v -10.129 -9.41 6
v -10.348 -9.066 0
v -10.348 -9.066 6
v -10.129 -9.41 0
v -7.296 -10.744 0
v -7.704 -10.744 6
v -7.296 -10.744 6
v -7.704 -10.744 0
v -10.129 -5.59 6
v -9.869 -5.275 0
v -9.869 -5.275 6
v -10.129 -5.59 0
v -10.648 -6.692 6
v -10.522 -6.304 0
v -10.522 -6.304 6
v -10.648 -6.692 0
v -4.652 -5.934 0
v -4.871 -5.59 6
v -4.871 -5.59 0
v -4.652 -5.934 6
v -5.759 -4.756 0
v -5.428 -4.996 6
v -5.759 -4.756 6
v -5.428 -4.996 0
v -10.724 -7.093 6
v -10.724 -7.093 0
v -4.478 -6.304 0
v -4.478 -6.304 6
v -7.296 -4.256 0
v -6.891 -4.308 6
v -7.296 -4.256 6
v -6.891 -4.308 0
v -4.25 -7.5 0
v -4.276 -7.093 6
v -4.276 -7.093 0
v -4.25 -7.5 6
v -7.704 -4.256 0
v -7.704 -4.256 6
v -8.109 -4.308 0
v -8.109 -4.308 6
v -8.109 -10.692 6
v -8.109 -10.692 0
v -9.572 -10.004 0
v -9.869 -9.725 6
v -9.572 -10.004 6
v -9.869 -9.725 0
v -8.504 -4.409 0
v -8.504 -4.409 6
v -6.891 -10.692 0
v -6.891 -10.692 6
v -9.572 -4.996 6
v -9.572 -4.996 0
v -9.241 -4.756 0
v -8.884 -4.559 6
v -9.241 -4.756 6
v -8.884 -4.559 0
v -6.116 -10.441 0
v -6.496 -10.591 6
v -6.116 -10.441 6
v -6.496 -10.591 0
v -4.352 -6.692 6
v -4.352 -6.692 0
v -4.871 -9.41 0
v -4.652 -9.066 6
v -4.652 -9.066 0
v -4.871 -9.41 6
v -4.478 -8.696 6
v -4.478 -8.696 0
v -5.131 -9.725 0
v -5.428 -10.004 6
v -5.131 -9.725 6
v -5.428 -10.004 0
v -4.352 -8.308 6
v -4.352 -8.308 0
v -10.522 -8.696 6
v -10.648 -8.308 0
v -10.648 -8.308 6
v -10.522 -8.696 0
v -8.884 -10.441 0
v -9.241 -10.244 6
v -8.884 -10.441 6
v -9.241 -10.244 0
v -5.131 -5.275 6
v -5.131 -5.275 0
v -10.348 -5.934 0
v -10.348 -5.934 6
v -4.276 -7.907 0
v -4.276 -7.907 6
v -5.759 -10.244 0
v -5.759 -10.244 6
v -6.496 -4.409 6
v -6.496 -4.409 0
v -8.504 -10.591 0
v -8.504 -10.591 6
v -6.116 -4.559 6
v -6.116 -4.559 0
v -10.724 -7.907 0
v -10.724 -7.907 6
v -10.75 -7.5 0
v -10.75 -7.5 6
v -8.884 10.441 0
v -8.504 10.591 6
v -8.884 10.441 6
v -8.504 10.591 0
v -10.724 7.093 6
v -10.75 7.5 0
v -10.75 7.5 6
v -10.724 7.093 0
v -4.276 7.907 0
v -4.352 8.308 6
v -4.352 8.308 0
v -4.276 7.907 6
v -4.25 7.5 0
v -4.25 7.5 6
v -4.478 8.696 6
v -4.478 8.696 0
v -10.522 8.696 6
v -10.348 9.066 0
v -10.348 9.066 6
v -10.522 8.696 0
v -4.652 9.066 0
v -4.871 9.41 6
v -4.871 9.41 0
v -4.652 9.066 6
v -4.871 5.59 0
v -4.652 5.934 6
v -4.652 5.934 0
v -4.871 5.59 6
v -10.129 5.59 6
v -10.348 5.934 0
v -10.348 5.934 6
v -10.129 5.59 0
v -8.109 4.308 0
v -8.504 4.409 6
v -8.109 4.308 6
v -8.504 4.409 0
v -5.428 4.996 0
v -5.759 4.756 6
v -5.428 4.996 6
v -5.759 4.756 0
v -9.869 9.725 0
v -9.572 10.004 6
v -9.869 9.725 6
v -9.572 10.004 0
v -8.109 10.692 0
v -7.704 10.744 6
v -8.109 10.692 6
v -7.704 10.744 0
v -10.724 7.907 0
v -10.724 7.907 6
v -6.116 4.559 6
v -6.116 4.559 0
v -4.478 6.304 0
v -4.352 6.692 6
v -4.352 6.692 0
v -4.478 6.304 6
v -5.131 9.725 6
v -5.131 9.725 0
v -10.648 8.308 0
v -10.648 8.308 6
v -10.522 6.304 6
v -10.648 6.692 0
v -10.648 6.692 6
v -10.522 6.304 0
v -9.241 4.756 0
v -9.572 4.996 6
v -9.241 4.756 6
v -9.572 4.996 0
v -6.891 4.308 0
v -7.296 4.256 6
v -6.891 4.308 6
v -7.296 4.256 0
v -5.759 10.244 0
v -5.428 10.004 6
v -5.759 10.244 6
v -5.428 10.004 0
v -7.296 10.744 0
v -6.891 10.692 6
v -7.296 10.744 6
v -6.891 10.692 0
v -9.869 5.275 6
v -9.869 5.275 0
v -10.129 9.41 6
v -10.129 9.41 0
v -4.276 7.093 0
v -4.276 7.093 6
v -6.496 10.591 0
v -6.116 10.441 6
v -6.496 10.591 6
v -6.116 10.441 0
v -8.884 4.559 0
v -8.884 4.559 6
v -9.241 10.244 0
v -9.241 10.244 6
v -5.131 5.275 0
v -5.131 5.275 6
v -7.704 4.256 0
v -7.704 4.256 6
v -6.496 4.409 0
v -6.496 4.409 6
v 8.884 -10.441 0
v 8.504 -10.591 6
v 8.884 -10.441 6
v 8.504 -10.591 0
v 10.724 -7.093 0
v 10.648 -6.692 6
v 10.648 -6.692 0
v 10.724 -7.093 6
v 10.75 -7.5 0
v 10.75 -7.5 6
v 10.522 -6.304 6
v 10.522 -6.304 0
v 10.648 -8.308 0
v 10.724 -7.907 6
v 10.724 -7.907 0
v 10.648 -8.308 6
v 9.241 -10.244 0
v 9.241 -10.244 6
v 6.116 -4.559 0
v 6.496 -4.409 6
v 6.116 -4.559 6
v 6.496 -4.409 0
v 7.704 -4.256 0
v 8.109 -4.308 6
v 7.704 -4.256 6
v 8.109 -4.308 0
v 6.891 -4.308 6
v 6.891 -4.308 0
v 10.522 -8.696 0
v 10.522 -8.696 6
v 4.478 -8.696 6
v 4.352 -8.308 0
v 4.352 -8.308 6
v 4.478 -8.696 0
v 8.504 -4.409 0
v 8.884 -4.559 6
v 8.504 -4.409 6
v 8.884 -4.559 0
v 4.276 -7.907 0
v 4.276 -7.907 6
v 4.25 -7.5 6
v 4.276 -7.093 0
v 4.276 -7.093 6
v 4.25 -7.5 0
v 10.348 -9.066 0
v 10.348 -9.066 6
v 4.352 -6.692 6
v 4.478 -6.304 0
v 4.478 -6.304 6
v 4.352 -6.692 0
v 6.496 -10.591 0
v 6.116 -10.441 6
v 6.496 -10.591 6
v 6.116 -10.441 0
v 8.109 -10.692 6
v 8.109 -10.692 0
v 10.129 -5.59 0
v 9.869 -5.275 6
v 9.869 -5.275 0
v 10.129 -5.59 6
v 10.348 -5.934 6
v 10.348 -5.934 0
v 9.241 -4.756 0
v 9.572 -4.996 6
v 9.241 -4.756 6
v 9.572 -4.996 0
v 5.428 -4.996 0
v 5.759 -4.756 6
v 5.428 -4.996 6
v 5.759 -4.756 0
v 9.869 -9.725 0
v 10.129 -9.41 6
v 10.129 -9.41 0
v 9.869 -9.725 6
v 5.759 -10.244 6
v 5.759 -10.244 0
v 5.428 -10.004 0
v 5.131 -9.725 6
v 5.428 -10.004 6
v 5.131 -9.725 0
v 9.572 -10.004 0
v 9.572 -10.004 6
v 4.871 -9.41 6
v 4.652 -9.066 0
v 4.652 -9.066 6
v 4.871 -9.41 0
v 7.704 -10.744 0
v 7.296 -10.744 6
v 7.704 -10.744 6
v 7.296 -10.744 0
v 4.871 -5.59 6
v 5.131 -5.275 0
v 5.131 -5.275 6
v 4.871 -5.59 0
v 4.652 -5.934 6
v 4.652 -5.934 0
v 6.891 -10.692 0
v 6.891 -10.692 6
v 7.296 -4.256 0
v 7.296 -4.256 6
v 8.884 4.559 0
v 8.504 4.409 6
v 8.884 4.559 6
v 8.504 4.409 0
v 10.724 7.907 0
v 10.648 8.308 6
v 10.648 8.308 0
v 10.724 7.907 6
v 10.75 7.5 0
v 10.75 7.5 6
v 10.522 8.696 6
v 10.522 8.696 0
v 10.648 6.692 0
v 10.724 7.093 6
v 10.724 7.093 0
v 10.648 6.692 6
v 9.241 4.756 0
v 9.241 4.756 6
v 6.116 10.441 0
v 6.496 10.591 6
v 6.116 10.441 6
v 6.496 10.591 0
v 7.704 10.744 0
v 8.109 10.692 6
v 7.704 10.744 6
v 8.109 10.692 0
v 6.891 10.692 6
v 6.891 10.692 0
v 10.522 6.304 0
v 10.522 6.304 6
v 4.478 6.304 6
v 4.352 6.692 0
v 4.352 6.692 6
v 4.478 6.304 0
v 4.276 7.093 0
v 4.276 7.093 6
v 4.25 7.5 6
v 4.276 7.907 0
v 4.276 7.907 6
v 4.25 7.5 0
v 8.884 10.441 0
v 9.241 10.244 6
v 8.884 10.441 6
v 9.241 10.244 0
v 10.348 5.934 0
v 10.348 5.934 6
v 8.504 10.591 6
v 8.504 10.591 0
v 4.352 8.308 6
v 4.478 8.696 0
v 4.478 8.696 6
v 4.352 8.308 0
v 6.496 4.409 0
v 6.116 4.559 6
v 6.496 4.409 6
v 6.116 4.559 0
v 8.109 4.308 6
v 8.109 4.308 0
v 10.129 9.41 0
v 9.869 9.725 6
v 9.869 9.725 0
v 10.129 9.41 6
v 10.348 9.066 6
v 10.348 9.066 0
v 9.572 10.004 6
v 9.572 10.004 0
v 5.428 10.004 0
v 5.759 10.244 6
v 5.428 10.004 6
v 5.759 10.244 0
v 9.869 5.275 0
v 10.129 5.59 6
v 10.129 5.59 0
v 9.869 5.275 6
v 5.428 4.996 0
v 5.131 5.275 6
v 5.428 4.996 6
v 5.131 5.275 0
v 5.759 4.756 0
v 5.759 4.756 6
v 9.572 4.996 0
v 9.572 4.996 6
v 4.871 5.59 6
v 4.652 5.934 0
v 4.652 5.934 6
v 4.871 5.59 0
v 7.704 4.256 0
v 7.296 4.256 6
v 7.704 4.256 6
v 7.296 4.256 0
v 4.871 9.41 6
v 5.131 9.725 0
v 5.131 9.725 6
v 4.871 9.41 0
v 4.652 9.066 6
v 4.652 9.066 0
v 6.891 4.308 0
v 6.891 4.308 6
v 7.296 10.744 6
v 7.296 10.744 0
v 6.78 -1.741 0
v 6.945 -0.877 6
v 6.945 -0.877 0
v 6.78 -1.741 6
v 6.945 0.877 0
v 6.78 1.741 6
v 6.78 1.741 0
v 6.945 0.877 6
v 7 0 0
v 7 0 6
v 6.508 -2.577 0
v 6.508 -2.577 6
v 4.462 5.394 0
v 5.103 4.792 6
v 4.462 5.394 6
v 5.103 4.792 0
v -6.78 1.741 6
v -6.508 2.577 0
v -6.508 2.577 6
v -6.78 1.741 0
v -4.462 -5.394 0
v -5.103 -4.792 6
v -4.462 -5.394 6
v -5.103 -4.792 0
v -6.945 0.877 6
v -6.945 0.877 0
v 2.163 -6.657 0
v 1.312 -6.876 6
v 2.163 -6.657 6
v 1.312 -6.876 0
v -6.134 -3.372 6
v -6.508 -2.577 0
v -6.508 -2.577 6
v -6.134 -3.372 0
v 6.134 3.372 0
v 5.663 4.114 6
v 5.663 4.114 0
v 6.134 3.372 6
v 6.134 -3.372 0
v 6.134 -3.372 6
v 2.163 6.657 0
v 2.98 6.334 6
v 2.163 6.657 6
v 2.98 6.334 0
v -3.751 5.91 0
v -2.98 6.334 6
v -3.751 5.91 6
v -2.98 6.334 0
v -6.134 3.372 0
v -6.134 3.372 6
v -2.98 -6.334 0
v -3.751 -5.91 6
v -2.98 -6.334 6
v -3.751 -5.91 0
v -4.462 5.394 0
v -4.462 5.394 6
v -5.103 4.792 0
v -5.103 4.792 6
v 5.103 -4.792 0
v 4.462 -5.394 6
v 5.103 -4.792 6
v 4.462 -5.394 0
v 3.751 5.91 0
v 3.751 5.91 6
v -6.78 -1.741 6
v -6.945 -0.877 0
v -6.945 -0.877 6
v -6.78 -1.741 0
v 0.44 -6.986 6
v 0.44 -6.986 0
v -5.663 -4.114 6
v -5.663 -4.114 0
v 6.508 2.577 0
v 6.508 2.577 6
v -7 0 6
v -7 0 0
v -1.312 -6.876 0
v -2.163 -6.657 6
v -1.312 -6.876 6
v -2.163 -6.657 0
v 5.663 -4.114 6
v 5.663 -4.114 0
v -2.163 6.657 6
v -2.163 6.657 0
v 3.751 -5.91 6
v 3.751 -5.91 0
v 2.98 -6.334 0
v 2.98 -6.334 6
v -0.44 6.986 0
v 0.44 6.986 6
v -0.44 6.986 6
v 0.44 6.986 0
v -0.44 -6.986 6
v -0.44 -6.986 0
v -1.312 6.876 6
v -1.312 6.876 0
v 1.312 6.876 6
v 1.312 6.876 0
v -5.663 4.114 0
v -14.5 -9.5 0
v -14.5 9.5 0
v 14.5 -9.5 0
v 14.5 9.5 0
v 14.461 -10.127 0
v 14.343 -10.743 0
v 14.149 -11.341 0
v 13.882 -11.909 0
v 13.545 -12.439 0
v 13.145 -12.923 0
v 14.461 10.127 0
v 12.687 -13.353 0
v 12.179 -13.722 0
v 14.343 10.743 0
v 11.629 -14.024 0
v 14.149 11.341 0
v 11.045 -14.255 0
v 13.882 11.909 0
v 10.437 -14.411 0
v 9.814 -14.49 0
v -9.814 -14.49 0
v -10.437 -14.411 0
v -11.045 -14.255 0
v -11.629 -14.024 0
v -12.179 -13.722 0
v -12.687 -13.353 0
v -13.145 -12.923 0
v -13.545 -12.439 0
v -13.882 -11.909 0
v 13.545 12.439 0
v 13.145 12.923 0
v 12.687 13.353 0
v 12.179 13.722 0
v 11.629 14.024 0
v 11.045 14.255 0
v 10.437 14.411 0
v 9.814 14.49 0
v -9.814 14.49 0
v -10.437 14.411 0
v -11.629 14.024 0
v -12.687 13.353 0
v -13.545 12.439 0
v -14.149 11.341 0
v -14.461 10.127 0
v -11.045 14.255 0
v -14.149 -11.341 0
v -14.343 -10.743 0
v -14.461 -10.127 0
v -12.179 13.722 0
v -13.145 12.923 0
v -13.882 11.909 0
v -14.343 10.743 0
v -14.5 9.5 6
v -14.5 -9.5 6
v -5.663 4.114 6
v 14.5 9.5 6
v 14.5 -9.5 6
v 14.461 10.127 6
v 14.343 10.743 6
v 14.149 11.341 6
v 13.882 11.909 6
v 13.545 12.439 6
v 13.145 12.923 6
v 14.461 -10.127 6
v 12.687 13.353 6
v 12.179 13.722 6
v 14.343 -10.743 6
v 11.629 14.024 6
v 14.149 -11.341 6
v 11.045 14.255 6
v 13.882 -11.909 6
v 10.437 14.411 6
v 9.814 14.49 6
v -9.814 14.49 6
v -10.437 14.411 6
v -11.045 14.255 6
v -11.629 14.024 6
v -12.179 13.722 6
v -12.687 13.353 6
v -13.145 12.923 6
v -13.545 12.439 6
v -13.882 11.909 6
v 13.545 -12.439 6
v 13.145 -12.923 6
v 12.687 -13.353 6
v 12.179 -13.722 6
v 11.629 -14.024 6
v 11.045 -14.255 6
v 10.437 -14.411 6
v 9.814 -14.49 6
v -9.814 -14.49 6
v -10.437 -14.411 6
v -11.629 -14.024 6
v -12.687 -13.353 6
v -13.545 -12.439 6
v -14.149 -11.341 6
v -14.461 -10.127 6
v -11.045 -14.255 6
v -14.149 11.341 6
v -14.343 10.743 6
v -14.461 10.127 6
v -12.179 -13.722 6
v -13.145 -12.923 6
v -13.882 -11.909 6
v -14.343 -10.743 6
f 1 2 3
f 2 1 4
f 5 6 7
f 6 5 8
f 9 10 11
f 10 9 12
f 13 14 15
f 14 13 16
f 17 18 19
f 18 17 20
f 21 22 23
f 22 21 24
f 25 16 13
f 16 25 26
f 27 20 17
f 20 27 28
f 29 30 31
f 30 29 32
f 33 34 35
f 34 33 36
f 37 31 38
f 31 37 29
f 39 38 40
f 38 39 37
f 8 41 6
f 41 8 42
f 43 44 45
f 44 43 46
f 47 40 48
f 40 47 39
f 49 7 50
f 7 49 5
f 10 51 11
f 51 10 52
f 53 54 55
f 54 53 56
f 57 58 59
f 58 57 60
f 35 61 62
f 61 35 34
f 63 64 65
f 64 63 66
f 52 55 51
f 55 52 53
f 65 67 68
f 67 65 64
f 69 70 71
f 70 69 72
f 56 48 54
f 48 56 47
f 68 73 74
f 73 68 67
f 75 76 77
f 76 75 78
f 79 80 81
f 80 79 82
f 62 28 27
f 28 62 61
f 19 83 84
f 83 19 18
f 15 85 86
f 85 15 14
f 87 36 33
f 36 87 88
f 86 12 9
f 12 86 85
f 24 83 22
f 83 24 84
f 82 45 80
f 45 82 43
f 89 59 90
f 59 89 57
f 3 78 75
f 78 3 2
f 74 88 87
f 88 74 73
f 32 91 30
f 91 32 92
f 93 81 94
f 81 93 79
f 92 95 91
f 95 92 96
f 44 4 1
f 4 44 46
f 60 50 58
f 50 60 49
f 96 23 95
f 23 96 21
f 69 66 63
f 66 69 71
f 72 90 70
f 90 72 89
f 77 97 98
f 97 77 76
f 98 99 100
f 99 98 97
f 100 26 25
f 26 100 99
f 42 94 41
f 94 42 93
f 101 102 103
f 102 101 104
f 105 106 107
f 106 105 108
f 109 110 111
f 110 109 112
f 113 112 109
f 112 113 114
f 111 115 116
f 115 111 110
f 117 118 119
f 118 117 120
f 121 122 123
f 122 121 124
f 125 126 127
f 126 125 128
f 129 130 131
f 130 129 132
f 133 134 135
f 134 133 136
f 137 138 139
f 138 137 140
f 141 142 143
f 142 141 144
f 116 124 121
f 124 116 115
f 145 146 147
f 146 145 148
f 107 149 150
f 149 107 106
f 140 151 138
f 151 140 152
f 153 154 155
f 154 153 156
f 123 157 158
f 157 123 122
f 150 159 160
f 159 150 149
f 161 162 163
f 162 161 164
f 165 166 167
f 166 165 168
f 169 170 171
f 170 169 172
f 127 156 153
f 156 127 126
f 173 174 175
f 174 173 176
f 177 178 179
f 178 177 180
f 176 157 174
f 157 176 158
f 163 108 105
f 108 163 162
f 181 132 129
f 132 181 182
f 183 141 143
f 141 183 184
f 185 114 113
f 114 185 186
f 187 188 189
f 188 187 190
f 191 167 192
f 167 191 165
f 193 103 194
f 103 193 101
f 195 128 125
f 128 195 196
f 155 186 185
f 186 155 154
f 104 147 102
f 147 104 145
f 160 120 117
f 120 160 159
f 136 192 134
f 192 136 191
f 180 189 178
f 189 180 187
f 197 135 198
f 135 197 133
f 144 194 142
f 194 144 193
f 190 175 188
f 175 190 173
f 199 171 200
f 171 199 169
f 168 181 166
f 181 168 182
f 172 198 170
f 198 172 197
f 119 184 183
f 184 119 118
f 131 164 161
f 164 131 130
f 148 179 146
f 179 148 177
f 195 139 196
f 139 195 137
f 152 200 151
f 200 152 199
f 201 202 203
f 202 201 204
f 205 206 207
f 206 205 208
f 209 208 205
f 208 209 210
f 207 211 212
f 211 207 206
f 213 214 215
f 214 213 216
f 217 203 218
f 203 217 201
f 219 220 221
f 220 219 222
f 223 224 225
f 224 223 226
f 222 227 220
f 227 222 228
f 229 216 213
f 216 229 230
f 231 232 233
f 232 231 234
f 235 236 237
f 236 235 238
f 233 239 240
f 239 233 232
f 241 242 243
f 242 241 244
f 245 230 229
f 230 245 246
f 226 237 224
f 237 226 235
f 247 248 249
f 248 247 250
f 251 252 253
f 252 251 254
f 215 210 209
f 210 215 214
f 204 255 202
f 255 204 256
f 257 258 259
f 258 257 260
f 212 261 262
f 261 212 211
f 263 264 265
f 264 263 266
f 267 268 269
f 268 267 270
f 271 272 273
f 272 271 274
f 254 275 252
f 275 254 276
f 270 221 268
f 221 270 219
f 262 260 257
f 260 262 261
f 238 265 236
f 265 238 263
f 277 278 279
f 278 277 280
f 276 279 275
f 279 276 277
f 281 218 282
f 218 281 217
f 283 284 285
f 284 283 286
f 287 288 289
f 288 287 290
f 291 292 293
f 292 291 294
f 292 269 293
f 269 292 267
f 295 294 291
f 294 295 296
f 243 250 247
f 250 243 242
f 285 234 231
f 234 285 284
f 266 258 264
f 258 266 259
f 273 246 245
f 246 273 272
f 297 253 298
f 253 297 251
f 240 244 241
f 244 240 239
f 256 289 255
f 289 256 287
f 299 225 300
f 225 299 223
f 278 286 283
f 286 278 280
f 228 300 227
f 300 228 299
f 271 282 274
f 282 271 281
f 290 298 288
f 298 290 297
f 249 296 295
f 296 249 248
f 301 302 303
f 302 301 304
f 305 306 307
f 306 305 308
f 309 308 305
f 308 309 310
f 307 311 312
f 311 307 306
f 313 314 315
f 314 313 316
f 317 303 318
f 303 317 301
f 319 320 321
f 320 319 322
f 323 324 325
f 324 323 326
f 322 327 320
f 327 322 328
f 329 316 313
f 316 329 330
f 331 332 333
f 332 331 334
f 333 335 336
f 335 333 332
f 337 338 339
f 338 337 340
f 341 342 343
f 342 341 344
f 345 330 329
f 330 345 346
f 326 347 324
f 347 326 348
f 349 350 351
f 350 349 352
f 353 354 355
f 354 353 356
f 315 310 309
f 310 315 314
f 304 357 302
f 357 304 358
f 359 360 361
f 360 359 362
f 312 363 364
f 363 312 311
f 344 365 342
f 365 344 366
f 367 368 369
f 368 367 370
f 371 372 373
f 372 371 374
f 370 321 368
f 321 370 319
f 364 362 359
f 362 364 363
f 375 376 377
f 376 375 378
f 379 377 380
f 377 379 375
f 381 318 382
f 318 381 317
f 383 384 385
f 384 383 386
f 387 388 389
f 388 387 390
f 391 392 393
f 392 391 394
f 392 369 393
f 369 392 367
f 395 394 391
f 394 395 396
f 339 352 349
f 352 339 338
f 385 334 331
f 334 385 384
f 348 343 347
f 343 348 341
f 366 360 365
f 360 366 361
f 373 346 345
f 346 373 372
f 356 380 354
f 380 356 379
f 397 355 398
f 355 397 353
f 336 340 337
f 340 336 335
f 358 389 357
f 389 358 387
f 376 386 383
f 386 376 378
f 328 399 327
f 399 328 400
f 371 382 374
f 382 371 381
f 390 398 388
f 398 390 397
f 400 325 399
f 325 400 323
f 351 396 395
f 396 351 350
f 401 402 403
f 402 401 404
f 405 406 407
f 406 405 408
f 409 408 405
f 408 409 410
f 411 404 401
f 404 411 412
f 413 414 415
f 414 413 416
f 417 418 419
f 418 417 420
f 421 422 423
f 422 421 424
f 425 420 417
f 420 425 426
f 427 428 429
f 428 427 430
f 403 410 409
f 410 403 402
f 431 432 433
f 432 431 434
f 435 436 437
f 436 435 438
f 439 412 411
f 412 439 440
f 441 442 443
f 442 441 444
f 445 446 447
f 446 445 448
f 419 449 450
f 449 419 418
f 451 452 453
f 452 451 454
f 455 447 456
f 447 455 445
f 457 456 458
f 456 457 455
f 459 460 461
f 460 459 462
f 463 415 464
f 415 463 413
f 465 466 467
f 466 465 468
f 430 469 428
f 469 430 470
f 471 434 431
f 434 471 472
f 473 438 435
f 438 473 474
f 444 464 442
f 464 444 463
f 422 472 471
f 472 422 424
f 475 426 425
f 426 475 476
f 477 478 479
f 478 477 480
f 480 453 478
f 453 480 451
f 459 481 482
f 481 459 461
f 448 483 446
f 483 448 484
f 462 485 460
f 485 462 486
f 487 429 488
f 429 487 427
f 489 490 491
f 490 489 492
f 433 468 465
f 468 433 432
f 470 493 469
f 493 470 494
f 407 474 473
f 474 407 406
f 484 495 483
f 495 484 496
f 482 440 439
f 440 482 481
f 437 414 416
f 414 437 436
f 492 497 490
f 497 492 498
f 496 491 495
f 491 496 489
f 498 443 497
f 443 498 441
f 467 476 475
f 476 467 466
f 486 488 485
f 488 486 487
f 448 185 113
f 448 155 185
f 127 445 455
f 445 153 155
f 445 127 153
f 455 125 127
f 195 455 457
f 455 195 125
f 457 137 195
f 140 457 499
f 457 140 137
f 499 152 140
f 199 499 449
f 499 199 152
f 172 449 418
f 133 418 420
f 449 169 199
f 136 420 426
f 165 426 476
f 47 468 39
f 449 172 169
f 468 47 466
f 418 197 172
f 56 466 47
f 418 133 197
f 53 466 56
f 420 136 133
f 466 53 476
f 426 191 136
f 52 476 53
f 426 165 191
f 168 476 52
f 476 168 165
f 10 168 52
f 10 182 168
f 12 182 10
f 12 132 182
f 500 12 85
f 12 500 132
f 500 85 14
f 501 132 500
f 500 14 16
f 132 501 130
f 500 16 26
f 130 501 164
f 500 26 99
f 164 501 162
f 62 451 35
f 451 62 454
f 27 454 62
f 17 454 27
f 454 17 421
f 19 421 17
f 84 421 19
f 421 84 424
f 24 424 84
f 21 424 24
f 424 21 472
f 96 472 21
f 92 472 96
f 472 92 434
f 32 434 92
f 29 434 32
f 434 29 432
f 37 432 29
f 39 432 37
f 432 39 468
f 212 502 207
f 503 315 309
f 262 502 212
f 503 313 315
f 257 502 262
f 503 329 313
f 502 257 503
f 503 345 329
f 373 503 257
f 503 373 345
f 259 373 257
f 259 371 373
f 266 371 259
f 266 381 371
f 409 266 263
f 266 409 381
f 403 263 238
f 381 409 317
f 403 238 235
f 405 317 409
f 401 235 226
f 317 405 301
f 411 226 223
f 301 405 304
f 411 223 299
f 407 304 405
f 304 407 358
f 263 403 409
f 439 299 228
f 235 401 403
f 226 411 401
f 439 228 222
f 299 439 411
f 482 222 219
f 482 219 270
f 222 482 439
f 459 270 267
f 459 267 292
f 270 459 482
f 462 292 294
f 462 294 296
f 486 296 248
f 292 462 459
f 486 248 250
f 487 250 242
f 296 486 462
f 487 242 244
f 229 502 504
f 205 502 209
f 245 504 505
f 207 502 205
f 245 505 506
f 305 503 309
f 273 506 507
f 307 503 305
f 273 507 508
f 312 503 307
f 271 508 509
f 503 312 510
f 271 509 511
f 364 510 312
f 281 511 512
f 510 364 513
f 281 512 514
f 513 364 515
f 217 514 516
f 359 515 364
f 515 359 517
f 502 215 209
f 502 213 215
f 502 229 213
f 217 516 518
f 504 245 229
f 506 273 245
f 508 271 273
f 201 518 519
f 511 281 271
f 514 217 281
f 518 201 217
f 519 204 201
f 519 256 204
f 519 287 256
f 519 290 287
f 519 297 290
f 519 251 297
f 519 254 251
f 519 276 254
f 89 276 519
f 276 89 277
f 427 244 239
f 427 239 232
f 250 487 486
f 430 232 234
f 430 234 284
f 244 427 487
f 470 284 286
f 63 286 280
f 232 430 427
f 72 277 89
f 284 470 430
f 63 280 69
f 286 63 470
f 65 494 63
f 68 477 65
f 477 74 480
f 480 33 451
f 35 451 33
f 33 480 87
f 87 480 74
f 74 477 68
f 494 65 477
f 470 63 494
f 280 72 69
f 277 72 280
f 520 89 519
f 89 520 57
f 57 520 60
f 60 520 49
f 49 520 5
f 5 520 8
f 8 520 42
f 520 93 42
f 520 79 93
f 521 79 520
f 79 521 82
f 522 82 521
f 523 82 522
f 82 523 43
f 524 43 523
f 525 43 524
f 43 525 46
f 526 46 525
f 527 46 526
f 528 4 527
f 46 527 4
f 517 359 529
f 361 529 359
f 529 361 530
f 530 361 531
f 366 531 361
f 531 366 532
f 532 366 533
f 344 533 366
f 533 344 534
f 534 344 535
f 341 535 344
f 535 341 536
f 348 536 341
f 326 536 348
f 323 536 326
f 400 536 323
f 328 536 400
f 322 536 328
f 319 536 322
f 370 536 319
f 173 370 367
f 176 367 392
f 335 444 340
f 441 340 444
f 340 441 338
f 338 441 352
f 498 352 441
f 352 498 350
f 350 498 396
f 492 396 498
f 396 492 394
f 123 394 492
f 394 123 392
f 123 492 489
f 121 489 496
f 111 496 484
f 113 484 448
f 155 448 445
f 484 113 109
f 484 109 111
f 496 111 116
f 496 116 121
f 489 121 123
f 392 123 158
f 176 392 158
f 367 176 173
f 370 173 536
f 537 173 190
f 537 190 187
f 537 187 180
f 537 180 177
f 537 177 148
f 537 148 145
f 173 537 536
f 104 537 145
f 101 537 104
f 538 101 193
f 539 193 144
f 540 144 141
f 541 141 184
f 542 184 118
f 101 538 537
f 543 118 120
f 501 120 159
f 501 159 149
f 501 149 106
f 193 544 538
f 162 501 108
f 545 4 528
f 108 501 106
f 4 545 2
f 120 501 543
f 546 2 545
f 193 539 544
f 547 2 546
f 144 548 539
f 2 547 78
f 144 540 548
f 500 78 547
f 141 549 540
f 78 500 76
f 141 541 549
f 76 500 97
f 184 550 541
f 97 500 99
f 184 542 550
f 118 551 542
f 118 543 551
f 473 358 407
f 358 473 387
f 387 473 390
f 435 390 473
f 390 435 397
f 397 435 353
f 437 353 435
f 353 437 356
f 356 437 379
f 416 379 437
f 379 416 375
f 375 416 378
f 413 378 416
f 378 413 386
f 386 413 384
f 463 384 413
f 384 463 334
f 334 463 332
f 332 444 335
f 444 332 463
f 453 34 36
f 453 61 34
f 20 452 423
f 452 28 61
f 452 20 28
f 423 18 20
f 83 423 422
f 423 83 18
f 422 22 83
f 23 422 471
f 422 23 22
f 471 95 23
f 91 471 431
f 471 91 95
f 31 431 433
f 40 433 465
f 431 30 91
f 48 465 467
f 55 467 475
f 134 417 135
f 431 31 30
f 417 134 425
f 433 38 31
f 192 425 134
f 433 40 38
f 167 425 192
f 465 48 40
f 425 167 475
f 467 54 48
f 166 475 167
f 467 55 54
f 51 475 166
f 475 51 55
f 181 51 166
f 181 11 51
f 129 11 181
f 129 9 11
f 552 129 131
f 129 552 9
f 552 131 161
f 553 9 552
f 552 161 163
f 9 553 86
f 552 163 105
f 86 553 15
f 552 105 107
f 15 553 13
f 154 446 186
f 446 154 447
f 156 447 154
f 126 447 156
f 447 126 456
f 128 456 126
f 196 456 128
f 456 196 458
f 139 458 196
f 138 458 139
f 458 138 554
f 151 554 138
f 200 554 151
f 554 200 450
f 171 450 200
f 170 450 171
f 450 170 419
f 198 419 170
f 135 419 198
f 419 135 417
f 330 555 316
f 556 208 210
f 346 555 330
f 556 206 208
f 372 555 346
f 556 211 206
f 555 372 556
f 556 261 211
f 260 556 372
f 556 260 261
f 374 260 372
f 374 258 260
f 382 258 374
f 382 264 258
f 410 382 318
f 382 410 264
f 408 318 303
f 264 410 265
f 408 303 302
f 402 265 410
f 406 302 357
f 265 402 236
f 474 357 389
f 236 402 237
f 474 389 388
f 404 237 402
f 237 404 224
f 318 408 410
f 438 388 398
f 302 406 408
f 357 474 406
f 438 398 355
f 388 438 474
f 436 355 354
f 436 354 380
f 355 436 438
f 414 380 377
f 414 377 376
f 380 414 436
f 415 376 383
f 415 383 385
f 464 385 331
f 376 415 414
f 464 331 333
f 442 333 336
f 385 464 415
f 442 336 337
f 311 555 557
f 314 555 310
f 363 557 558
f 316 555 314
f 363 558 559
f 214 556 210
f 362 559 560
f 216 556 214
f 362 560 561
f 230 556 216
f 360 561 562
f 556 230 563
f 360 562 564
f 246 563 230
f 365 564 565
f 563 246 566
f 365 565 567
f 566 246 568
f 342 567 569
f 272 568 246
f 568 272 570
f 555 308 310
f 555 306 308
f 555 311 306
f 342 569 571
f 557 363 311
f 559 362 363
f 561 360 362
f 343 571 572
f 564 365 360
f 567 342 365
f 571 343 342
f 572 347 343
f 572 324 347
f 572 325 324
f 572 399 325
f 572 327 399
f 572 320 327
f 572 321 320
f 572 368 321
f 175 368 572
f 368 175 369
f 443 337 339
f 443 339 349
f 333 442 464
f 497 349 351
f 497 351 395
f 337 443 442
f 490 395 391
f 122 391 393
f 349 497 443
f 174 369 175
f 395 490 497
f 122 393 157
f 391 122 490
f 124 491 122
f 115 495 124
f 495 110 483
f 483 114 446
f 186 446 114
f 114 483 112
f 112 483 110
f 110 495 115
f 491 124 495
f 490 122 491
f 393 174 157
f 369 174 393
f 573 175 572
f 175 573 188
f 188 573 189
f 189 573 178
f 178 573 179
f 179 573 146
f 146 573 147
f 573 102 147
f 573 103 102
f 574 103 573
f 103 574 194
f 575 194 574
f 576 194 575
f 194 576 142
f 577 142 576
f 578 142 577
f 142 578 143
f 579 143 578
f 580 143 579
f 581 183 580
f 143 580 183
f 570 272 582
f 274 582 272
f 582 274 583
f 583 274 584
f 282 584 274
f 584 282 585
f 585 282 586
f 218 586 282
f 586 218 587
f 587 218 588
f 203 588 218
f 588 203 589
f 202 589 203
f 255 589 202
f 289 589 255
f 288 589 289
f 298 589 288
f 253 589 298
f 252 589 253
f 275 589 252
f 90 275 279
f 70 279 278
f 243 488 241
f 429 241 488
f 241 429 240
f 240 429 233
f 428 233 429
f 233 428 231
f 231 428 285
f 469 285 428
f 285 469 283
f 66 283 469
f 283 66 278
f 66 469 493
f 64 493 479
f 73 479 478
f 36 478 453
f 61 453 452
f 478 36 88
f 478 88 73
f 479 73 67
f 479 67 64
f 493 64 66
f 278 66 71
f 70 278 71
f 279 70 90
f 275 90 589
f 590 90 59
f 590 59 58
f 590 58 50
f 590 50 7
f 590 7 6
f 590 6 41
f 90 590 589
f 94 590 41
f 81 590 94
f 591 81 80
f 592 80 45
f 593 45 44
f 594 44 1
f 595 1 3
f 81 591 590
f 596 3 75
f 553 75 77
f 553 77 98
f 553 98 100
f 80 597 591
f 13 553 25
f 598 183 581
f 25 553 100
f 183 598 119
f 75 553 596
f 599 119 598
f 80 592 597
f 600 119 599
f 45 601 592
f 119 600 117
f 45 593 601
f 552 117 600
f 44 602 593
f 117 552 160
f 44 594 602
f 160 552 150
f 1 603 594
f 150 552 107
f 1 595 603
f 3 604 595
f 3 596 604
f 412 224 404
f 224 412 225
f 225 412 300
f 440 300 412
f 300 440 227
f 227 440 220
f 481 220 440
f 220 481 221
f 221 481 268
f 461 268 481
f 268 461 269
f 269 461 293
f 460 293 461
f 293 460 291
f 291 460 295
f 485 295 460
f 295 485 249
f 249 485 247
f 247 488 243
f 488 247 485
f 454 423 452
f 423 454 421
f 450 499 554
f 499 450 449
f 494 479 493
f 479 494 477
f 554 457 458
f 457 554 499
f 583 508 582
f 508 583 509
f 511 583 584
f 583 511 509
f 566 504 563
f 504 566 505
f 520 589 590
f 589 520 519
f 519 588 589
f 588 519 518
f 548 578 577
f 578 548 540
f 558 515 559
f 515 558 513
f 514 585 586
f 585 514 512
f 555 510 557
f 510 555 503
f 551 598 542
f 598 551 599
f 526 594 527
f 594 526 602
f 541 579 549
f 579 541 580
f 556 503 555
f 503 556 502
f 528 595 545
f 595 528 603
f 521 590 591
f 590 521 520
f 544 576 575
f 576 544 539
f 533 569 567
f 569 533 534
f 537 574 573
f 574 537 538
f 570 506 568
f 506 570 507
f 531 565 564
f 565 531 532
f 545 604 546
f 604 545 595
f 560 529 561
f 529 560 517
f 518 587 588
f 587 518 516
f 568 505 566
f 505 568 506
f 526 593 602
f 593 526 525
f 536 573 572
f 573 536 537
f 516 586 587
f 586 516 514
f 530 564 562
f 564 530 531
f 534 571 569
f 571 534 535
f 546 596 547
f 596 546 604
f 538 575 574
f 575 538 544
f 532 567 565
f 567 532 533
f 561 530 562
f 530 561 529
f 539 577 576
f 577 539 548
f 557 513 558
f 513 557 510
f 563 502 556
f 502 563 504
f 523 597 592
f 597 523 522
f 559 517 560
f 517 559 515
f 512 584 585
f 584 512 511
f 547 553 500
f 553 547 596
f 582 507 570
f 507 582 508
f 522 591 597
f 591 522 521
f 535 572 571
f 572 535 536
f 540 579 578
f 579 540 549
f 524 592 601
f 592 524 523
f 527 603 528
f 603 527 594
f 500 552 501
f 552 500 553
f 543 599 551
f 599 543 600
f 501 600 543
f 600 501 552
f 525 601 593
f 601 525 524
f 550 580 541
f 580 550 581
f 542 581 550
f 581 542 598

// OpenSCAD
$fn = 50;


difference() {
	union() {
		hull() {
			translate(v = [-9.5000000000, 9.5000000000, 0]) {
				cylinder(h = 6, r = 5);
			}
			translate(v = [9.5000000000, 9.5000000000, 0]) {
				cylinder(h = 6, r = 5);
			}
			translate(v = [-9.5000000000, -9.5000000000, 0]) {
				cylinder(h = 6, r = 5);
			}
			translate(v = [9.5000000000, -9.5000000000, 0]) {
				cylinder(h = 6, r = 5);
			}
		}
	}
	union() {
		#translate(v = [-7.5000000000, -7.5000000000, -100.0000000000]) {
			cylinder(h = 200, r = 3.2500000000);
		}
		#translate(v = [-7.5000000000, 7.5000000000, -100.0000000000]) {
			cylinder(h = 200, r = 3.2500000000);
		}
		#translate(v = [7.5000000000, -7.5000000000, -100.0000000000]) {
			cylinder(h = 200, r = 3.2500000000);
		}
		#translate(v = [7.5000000000, 7.5000000000, -100.0000000000]) {
			cylinder(h = 200, r = 3.2500000000);
		}
		#cylinder(h = 6, r = 7.0000000000);
	}
}
